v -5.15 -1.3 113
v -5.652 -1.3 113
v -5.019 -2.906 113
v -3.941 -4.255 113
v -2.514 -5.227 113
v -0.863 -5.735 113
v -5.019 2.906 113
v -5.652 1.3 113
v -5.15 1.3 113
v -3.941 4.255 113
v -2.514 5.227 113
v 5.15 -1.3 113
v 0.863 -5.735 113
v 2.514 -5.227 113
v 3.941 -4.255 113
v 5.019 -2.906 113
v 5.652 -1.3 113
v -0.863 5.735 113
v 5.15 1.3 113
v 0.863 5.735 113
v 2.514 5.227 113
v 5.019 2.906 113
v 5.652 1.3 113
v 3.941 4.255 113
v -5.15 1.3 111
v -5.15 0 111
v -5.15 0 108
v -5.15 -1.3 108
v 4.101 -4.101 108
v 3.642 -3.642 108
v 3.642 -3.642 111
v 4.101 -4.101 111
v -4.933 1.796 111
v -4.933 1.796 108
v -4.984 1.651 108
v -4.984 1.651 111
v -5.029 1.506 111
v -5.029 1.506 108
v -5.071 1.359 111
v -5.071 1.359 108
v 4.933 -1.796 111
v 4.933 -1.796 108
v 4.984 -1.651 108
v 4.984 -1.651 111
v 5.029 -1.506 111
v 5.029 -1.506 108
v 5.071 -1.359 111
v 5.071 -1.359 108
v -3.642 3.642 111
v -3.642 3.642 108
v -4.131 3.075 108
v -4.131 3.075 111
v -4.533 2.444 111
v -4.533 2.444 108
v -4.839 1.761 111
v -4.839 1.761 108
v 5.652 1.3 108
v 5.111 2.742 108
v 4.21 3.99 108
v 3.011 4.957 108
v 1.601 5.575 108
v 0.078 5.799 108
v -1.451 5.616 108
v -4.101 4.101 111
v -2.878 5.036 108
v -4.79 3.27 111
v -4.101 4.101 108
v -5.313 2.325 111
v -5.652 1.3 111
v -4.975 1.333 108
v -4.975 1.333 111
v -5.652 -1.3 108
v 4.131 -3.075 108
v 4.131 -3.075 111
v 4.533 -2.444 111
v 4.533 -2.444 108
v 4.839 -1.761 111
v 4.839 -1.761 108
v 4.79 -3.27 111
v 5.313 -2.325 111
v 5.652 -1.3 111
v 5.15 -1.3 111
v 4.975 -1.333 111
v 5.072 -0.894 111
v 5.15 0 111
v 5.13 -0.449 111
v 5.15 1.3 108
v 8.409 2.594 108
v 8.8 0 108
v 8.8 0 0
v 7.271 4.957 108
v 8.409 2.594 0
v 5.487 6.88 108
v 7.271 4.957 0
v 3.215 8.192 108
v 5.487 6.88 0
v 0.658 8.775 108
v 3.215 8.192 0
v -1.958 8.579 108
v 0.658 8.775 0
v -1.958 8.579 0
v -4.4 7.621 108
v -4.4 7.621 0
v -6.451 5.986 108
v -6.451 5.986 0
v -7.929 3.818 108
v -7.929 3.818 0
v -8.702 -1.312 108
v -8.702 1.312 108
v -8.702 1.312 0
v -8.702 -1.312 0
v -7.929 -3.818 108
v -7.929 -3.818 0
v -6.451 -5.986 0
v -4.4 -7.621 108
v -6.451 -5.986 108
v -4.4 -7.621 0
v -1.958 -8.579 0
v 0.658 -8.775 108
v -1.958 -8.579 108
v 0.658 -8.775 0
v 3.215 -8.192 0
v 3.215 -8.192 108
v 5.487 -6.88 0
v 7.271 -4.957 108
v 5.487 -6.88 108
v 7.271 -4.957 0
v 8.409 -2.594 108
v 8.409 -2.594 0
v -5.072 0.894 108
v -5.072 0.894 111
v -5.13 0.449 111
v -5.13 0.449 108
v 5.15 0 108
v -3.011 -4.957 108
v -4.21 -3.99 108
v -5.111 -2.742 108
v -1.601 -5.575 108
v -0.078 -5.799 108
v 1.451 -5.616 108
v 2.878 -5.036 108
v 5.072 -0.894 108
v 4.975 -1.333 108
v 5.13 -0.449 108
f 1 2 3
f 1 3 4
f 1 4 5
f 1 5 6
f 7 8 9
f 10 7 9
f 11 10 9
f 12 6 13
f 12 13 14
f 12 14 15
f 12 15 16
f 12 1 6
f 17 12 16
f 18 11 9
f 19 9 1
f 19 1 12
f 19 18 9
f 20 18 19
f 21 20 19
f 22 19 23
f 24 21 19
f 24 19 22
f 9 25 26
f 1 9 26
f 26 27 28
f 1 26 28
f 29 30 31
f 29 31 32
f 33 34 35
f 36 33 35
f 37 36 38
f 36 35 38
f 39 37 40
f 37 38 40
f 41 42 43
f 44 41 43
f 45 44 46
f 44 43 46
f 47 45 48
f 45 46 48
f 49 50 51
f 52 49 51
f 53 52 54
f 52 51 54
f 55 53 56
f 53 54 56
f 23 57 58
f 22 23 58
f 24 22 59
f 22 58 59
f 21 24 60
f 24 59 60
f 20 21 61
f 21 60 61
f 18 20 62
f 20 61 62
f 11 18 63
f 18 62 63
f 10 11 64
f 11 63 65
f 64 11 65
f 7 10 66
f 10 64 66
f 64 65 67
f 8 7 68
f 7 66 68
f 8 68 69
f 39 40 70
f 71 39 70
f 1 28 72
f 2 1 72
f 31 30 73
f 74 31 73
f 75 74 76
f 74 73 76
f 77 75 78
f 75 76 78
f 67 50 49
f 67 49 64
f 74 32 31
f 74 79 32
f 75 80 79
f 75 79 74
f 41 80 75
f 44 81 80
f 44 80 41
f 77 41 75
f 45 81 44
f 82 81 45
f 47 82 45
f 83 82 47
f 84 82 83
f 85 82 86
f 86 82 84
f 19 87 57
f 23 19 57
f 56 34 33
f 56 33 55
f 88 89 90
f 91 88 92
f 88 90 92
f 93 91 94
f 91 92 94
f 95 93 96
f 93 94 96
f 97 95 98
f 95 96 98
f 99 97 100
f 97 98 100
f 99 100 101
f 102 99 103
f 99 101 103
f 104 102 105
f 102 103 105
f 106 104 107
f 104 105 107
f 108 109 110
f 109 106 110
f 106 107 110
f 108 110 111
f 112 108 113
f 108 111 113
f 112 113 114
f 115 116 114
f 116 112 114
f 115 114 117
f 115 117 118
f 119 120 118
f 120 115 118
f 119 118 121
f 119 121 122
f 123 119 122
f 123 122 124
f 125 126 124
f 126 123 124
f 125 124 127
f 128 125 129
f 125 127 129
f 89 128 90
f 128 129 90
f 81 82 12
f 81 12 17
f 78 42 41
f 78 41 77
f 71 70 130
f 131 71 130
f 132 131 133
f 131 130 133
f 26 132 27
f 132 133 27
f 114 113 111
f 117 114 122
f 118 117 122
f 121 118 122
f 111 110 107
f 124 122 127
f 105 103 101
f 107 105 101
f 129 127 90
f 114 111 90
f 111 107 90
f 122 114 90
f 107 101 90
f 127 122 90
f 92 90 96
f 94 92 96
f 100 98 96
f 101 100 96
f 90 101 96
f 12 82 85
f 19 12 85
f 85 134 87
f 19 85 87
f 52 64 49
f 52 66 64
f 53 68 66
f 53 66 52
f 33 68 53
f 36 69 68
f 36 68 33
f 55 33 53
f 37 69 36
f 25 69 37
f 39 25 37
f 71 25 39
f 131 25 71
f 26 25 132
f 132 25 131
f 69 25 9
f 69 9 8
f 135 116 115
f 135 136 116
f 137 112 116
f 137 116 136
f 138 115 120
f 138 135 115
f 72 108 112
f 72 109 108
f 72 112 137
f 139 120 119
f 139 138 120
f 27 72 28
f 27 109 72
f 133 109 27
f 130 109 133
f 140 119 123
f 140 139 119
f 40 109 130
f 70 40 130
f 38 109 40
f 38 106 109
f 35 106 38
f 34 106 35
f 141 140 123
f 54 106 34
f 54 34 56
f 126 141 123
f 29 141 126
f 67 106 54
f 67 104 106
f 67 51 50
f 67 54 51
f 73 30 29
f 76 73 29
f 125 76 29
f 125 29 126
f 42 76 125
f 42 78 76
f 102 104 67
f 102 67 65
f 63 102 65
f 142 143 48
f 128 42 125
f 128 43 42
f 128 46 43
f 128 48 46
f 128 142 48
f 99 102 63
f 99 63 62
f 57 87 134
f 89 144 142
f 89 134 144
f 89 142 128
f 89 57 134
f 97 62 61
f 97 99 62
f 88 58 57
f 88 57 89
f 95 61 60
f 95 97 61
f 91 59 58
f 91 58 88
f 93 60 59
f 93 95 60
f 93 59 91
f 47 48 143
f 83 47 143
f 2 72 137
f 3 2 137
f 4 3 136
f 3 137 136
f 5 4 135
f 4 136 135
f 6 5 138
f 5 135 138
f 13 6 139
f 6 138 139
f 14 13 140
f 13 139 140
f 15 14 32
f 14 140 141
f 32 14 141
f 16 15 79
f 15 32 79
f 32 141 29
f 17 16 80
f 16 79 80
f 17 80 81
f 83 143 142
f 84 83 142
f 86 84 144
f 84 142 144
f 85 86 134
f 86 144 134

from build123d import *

# Parameters (mm, degrees)
SKETCH_R              = 8.8
PAD_DEPTH             = 108
SKETCH001_R           = 5.8
PAD001_DEPTH          = 5
SKETCH002_W           = 5
SKETCH002_H           = 2.6
POCKET_DEPTH          = 5
POLARPATTERN_COUNT    = 2
POCKET001_DEPTH       = 3
POLARPATTERN001_COUNT = 2
PAD002_DEPTH          = 5
POLARPATTERN002_COUNT = 2


with BuildPart() as part:
    # Sketch → Pad (new body)
    with BuildSketch(Plane.XY):
        Circle(SKETCH_R)
    extrude(amount=PAD_DEPTH)

    # Sketch001 → Pad001 (join)
    with BuildSketch(Plane.XY.offset(108)):
        Circle(SKETCH001_R)
    extrude(amount=PAD001_DEPTH)

    # Sketch002 → Pocket (cut)
    with BuildSketch(Plane.XY.offset(108)):
        with Locations((7.65, 0)):
            Rectangle(SKETCH002_W, SKETCH002_H)
    pocket = extrude(amount=POCKET_DEPTH, mode=Mode.SUBTRACT)

    # PolarPattern: Pocket ×2 about axis
    polarpattern_axis = Axis((0, 0, 108), (0, 0, 1))
    for i in range(1, POLARPATTERN_COUNT):
        add(pocket.rotate(polarpattern_axis, i * 360 / POLARPATTERN_COUNT), mode=Mode.SUBTRACT)

    # Sketch003 (on Face3 of PolarPattern) → Pocket001 (cut)
    with BuildSketch(Plane.XY.offset(108)):
        with BuildLine():
            ThreePointArc((3.6416, -3.6416), (4.75798, -1.97082), (5.15, 0))
            Line((8, 0), (5.15, 0))
            ThreePointArc((5.656854, -5.656854), (7.391036, -3.061467), (8, 0))
            Line((3.6416, -3.6416), (5.656854, -5.656854))
        make_face()
    pocket001 = extrude(amount=POCKET001_DEPTH, mode=Mode.SUBTRACT)

    # PolarPattern001: Pocket001 ×2 about axis
    polarpattern001_axis = Axis((0, 0, 108), (0, 0, 1))
    for i in range(1, POLARPATTERN001_COUNT):
        add(pocket001.rotate(polarpattern001_axis, i * 360 / POLARPATTERN001_COUNT), mode=Mode.SUBTRACT)

    # Sketch004 (on Face3 of PolarPattern001) → Pad002 (join)
    with BuildSketch(Plane.XY.offset(108)):
        with BuildLine():
            ThreePointArc((4.933386, -1.795606), (5.007014, -1.578705), (5.071111, -1.3588))
            Line((5.071111, -1.3588), (0, 0))
            Line((4.933386, -1.795606), (0, 0))
        make_face()
    pad002 = extrude(amount=PAD002_DEPTH)

    # PolarPattern002: Pad002 ×2 about axis
    polarpattern002_axis = Axis((0, 0, 108), (0, 0, 1))
    for i in range(1, POLARPATTERN002_COUNT):
        add(pad002.rotate(polarpattern002_axis, i * 360 / POLARPATTERN002_COUNT))


solid = part.part
